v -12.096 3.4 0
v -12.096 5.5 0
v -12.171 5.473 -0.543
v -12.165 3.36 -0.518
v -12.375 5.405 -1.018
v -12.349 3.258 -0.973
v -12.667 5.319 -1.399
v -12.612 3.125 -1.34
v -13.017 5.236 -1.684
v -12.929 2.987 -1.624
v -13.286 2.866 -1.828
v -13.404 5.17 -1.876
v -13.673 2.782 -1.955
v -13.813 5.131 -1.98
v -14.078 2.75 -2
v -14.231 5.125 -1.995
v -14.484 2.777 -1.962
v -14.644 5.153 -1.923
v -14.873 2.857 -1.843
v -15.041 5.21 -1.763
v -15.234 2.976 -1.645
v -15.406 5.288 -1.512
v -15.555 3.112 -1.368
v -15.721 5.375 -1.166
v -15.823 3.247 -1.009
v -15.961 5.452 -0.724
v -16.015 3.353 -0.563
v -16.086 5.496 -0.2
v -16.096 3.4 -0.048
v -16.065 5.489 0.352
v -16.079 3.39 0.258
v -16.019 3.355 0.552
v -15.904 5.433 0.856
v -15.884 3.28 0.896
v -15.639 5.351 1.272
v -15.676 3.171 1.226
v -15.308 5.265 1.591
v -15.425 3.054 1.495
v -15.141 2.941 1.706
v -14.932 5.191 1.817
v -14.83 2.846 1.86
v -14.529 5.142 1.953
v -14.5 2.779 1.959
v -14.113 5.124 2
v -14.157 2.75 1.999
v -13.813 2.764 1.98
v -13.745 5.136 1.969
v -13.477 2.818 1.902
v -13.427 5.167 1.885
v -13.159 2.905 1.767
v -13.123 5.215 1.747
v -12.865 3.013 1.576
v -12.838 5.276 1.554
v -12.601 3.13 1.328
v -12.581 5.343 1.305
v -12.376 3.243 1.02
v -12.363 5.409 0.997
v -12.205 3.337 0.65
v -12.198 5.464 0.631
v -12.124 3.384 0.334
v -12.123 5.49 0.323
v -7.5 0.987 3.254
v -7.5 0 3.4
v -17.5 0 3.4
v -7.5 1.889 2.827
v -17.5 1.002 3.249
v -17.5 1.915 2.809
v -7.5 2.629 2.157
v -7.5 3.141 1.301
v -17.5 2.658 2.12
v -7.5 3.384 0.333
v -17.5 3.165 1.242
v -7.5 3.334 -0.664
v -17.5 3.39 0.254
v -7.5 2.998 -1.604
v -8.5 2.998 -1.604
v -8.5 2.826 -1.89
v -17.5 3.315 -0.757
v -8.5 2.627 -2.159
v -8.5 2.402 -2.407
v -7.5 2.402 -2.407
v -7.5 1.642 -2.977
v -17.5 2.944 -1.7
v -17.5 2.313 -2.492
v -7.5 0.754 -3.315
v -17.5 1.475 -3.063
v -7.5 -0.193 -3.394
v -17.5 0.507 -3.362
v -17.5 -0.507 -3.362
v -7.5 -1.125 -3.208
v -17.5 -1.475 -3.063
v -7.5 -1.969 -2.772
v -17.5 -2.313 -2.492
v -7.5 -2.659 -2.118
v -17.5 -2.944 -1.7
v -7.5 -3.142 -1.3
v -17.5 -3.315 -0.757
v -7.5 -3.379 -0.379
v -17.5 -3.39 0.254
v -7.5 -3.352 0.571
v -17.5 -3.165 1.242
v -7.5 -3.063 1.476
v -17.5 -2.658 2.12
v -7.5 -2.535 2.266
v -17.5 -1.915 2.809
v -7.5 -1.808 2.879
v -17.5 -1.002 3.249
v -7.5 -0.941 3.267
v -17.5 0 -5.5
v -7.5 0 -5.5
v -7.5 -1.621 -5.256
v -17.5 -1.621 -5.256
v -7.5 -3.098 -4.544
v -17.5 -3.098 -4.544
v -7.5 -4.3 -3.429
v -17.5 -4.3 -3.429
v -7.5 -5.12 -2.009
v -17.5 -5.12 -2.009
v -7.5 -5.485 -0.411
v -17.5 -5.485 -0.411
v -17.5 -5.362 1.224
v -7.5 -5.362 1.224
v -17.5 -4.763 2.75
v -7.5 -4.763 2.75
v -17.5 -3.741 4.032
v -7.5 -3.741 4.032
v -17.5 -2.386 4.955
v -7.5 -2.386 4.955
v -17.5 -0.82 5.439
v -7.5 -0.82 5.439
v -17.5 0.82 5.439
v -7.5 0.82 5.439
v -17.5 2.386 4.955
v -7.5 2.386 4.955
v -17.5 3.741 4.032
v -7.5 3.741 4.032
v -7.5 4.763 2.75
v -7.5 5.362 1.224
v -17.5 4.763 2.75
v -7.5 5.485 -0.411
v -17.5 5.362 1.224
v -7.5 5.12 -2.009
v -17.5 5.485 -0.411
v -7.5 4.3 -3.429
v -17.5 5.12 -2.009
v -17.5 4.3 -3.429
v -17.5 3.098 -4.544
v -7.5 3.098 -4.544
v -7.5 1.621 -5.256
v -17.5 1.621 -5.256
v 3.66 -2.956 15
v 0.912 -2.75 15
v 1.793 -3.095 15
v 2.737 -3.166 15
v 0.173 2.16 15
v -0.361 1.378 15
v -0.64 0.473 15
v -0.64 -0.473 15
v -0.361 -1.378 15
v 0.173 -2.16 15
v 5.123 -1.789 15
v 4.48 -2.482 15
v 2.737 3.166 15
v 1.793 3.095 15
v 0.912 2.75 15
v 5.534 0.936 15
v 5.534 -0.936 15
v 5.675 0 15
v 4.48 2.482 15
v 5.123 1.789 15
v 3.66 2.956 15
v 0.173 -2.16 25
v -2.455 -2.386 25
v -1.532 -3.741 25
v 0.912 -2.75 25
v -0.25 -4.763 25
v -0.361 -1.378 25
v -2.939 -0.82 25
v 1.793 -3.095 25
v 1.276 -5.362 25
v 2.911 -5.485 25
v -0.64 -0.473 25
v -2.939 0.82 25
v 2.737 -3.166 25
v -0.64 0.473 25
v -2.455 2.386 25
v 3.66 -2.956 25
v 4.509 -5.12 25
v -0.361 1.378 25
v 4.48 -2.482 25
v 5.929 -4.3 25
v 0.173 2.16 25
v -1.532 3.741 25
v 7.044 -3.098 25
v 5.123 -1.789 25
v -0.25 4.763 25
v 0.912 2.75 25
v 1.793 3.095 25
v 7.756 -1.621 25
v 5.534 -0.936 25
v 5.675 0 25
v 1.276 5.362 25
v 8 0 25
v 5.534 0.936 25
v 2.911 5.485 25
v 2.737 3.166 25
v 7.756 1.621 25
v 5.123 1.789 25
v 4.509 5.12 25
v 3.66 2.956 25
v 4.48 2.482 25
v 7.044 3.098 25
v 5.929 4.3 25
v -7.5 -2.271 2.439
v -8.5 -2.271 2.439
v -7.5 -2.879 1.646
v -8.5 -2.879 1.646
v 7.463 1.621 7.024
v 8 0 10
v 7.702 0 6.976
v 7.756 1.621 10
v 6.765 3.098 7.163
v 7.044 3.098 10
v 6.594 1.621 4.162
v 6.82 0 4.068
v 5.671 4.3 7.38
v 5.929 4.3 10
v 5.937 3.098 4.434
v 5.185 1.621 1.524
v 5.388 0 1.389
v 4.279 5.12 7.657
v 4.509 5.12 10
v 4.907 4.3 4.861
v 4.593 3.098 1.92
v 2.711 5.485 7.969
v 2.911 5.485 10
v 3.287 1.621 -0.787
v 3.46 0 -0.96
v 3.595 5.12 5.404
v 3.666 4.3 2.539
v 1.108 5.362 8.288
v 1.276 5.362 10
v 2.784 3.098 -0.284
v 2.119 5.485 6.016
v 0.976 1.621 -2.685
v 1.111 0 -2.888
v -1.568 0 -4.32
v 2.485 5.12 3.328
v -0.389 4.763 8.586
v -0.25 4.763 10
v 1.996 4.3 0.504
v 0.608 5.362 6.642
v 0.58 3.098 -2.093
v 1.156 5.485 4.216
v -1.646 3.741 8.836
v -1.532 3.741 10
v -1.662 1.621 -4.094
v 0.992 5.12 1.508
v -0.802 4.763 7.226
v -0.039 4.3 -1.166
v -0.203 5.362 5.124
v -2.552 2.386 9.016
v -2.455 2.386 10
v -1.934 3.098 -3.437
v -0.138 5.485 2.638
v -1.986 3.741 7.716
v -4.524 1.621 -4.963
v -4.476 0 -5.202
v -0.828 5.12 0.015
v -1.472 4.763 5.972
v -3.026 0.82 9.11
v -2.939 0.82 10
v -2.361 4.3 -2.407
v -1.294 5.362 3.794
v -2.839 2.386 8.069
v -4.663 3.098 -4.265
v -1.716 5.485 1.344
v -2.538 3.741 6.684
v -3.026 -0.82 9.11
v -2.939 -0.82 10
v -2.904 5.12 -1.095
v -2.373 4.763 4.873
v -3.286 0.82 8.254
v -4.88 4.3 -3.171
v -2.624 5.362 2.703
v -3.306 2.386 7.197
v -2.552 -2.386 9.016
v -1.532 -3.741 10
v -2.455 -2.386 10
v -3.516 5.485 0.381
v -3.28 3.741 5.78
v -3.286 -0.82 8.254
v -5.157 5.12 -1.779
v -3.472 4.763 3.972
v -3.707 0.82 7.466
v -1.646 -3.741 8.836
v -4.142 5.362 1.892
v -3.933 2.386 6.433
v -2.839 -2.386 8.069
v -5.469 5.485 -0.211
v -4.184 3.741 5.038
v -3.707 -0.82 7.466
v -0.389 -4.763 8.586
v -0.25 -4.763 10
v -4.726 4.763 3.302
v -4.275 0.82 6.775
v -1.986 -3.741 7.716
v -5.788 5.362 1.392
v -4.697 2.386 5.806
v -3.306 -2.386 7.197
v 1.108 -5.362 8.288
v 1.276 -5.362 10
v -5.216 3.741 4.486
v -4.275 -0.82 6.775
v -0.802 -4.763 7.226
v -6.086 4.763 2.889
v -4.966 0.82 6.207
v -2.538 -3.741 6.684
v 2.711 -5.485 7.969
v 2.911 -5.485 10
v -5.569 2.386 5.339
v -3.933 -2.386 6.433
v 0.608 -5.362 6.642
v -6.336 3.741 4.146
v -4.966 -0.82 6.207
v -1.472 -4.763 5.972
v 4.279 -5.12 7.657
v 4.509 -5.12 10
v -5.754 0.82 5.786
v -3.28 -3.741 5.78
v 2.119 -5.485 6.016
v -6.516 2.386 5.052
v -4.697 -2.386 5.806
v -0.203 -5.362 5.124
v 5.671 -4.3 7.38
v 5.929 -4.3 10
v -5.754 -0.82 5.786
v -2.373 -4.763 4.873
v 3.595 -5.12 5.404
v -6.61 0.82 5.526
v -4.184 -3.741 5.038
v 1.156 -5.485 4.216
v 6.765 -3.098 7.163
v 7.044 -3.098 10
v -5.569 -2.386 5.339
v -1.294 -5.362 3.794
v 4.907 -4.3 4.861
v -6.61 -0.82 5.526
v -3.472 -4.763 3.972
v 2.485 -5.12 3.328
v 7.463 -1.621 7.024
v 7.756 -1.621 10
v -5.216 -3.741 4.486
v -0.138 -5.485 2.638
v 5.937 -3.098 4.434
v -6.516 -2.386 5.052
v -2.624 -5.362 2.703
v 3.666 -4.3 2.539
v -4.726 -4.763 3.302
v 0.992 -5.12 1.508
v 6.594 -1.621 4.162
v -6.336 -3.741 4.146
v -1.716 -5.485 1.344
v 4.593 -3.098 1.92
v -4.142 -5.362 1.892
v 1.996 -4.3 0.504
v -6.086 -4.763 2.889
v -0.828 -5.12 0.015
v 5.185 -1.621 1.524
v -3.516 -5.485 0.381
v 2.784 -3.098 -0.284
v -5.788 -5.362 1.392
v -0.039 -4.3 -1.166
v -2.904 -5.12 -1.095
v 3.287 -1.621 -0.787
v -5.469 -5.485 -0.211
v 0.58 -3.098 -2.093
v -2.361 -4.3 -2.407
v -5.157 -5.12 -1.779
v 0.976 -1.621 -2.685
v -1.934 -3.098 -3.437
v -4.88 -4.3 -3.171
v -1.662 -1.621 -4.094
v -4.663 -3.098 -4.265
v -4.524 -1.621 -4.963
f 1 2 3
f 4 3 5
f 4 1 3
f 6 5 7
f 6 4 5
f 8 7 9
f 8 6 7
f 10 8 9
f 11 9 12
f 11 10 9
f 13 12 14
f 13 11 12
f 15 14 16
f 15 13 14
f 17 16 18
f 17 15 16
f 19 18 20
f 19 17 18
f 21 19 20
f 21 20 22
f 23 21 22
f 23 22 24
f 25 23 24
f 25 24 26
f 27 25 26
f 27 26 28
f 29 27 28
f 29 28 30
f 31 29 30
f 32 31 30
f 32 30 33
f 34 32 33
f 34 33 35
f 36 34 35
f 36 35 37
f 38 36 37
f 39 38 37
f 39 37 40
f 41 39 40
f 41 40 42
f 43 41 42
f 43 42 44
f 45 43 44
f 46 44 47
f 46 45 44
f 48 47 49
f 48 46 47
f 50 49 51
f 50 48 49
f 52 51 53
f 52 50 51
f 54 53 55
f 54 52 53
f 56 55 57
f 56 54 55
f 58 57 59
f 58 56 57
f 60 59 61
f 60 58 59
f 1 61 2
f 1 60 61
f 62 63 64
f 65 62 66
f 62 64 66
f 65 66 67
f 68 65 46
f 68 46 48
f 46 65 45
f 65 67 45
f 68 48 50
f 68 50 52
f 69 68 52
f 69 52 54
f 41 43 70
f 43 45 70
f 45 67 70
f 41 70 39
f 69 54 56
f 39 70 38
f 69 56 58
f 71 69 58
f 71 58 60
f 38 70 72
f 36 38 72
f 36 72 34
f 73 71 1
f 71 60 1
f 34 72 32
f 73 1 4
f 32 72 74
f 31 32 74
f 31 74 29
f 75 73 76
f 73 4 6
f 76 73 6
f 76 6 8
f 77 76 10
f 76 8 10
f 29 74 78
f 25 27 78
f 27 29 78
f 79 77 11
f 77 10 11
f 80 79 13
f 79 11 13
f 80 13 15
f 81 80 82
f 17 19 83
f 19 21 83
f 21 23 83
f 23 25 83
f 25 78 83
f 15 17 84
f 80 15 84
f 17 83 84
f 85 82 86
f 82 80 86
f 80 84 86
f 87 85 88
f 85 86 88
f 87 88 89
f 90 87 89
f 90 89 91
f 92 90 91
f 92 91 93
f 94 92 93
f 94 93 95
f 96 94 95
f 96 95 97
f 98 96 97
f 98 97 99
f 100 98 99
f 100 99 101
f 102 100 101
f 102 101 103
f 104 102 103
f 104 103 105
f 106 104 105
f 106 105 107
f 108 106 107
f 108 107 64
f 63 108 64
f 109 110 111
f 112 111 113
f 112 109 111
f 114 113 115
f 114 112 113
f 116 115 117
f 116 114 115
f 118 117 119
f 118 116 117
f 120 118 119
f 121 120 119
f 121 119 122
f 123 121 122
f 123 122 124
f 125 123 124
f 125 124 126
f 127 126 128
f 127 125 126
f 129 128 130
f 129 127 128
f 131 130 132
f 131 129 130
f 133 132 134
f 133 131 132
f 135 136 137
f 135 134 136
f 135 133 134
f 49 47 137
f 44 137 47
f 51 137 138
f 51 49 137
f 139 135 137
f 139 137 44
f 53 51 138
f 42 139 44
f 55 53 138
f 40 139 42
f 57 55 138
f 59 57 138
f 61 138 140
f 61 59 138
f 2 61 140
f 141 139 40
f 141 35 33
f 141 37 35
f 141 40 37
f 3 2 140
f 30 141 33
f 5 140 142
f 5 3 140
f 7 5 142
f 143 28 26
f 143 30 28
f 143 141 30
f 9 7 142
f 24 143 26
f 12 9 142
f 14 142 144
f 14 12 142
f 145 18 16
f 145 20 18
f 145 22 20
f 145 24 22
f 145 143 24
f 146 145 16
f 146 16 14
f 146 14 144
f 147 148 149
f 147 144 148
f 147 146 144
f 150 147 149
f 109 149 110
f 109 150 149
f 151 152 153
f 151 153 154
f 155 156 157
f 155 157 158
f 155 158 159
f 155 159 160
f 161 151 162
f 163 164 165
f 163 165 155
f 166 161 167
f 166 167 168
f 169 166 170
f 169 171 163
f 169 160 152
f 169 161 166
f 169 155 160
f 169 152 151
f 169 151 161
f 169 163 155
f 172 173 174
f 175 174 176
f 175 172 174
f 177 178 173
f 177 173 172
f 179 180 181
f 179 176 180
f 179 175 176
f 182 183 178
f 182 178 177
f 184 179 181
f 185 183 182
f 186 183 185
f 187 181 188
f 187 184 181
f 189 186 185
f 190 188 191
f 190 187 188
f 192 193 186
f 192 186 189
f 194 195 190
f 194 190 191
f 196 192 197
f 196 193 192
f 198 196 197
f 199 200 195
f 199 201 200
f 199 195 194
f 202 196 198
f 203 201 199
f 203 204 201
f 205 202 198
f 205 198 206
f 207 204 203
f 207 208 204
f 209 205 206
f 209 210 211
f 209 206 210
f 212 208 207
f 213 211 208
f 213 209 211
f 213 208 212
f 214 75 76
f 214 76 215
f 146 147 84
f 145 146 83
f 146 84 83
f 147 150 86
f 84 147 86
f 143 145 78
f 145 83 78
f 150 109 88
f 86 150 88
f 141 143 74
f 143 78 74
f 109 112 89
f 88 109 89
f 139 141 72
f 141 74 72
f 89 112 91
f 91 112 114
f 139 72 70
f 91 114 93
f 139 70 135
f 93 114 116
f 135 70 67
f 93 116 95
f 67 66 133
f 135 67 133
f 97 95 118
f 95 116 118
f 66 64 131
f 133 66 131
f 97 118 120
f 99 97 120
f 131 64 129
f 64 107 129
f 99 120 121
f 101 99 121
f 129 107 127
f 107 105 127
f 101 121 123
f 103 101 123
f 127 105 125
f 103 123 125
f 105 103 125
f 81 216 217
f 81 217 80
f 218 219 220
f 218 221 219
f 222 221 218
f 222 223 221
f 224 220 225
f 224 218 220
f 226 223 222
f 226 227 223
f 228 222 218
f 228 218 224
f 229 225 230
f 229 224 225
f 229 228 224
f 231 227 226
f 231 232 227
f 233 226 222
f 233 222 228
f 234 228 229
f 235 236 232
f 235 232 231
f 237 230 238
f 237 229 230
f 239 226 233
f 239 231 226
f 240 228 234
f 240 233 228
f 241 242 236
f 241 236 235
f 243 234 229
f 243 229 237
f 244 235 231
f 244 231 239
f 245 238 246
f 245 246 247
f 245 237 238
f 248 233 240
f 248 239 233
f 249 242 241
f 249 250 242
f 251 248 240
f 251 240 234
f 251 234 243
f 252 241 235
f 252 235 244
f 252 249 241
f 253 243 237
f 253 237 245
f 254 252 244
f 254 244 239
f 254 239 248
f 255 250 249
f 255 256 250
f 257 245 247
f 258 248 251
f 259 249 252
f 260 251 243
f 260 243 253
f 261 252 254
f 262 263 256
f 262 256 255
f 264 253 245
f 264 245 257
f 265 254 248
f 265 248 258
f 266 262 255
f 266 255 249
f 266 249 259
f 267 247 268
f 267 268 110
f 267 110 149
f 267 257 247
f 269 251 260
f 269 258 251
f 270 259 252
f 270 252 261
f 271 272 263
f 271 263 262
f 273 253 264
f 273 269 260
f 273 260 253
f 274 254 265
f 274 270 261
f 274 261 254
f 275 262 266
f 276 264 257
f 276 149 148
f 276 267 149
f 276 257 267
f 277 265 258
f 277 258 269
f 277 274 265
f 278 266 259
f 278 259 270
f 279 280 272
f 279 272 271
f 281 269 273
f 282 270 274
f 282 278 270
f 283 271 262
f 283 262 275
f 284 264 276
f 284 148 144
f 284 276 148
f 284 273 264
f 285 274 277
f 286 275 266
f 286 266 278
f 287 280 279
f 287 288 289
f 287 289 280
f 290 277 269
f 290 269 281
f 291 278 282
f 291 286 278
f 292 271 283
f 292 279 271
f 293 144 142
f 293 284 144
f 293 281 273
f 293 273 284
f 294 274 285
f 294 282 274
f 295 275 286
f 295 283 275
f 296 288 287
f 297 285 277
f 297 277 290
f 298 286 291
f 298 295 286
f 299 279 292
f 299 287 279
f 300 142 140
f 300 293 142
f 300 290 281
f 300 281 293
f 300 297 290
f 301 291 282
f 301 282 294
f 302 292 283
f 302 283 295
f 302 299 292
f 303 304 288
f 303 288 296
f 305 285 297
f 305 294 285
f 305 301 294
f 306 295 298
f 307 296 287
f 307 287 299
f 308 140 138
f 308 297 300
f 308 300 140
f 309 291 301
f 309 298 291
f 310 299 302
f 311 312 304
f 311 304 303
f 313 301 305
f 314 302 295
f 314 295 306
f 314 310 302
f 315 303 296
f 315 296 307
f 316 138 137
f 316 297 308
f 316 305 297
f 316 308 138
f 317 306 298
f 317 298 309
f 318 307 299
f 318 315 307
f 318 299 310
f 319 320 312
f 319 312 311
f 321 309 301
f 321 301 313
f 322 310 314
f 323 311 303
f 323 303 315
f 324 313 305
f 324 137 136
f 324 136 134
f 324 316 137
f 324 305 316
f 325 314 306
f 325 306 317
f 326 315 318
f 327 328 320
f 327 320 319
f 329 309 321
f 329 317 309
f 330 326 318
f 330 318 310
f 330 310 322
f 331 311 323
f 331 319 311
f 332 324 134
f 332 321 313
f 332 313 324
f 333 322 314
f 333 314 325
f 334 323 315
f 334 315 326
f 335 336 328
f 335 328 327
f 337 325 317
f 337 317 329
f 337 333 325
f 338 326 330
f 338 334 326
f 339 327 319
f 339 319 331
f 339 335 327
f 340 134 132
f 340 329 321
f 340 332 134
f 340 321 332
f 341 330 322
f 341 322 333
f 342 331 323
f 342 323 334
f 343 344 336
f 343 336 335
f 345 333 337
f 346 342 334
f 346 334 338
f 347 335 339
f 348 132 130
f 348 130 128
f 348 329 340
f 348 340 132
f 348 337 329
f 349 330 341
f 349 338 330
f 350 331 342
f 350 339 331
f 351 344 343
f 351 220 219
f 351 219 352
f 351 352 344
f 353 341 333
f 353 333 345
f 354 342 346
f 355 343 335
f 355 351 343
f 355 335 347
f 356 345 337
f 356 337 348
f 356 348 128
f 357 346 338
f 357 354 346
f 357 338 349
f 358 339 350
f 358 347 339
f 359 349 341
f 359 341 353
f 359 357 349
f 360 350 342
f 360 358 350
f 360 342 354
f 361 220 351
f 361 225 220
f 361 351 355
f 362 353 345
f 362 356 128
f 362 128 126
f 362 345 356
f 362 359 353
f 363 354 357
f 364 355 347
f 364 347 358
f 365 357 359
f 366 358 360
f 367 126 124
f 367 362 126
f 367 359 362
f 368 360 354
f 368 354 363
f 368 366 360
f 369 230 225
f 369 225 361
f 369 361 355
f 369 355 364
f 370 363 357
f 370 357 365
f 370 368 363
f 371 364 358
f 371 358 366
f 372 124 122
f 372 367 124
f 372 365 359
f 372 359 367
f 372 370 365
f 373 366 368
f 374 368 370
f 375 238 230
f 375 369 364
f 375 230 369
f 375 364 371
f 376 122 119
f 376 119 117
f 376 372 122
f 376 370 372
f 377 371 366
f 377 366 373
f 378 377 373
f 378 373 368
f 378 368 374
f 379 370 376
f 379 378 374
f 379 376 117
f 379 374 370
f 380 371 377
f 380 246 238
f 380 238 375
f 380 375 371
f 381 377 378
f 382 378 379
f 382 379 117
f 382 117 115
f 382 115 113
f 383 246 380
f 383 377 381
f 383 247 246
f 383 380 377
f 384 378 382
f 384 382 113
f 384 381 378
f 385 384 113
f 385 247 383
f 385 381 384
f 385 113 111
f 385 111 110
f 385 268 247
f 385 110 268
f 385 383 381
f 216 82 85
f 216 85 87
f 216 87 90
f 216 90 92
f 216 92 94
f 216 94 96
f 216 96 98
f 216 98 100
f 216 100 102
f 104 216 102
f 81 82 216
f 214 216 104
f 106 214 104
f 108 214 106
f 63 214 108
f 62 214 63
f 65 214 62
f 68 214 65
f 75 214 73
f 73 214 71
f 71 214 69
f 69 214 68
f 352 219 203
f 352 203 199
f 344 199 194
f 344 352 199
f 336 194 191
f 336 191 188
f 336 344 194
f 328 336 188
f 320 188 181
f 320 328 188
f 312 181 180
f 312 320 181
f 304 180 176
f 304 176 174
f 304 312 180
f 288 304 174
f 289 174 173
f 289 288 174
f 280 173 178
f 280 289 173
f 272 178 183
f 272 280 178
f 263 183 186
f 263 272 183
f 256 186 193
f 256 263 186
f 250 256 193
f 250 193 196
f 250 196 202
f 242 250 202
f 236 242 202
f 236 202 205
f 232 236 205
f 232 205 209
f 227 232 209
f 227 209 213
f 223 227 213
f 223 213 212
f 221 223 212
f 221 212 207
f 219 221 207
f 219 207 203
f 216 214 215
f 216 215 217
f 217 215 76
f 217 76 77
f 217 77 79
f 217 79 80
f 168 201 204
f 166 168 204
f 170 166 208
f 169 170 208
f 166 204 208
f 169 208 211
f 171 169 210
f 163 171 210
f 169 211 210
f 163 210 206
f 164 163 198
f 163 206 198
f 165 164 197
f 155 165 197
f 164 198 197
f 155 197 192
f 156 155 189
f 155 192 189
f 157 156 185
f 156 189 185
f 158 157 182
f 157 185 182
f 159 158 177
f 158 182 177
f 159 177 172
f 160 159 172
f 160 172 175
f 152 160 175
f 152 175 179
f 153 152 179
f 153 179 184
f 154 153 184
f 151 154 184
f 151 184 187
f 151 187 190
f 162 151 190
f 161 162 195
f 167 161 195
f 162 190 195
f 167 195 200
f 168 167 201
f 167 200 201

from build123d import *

# Parameters (mm, degrees)
SKETCH4_R         = 5.5
SKETCH6_R         = 3.175
HOLE_SHAFT_DEPTH  = 10
SKETCH7_R         = 3.4
HOLE_POT_DEPTH    = 10
SKETCH8_R         = 2
HOLE_INSERT_DEPTH = 6.5000001
SLOT_BOSS_DEPTH   = 1


with BuildPart() as part:
    # Sweep2: sweep along a path in PROFILE
    with BuildLine(Plane(origin=(0, 0, 0), x_dir=(1, 0, 0), z_dir=(0, 1, 0))) as sweep2_path:
        Line((2.5, -25), (2.5, -10))
        ThreePointArc((2.5, -10), (-0.428932188, -2.928932188), (-7.5, 0))
        Line((-7.5, 0), (-17.5, 0))
    # Sketch4 → Sweep2 (sweep)
    with BuildSketch(Plane.XY.offset(25)):
        with Locations((2.5, 0)):
            Circle(SKETCH4_R)
    sweep(path=sweep2_path.line)

    # Sketch6 → HOLE_SHAFT (cut)
    with BuildSketch(Plane.XY.offset(25)):
        with Locations((2.5, 0)):
            Circle(SKETCH6_R)
    extrude(amount=-HOLE_SHAFT_DEPTH, mode=Mode.SUBTRACT)

    # Sketch7 → HOLE_POT (cut)
    with BuildSketch(Plane.ZY.offset(17.5)):
        Circle(SKETCH7_R)
    extrude(amount=-HOLE_POT_DEPTH, mode=Mode.SUBTRACT)

    # Sketch8 → HOLE_INSERT (cut, through all)
    with BuildSketch(Plane(origin=(0, 0, 0), x_dir=(1, 0, 0), z_dir=(0, 1, 0))):
        with Locations((-14.096251262, 0)):
            Circle(SKETCH8_R)
    extrude(amount=HOLE_INSERT_DEPTH, mode=Mode.SUBTRACT)

    # Sketch11 → SLOT_BOSS (add)
    with BuildSketch(Plane.ZY.offset(7.5)):
        Polygon((1.645649924, -2.879269115), (-2.456130729, 2.466275506), (-1.662777389, 3.075036935), (2.439003264, -2.270507686), align=None)
    extrude(amount=SLOT_BOSS_DEPTH)


solid = part.part
